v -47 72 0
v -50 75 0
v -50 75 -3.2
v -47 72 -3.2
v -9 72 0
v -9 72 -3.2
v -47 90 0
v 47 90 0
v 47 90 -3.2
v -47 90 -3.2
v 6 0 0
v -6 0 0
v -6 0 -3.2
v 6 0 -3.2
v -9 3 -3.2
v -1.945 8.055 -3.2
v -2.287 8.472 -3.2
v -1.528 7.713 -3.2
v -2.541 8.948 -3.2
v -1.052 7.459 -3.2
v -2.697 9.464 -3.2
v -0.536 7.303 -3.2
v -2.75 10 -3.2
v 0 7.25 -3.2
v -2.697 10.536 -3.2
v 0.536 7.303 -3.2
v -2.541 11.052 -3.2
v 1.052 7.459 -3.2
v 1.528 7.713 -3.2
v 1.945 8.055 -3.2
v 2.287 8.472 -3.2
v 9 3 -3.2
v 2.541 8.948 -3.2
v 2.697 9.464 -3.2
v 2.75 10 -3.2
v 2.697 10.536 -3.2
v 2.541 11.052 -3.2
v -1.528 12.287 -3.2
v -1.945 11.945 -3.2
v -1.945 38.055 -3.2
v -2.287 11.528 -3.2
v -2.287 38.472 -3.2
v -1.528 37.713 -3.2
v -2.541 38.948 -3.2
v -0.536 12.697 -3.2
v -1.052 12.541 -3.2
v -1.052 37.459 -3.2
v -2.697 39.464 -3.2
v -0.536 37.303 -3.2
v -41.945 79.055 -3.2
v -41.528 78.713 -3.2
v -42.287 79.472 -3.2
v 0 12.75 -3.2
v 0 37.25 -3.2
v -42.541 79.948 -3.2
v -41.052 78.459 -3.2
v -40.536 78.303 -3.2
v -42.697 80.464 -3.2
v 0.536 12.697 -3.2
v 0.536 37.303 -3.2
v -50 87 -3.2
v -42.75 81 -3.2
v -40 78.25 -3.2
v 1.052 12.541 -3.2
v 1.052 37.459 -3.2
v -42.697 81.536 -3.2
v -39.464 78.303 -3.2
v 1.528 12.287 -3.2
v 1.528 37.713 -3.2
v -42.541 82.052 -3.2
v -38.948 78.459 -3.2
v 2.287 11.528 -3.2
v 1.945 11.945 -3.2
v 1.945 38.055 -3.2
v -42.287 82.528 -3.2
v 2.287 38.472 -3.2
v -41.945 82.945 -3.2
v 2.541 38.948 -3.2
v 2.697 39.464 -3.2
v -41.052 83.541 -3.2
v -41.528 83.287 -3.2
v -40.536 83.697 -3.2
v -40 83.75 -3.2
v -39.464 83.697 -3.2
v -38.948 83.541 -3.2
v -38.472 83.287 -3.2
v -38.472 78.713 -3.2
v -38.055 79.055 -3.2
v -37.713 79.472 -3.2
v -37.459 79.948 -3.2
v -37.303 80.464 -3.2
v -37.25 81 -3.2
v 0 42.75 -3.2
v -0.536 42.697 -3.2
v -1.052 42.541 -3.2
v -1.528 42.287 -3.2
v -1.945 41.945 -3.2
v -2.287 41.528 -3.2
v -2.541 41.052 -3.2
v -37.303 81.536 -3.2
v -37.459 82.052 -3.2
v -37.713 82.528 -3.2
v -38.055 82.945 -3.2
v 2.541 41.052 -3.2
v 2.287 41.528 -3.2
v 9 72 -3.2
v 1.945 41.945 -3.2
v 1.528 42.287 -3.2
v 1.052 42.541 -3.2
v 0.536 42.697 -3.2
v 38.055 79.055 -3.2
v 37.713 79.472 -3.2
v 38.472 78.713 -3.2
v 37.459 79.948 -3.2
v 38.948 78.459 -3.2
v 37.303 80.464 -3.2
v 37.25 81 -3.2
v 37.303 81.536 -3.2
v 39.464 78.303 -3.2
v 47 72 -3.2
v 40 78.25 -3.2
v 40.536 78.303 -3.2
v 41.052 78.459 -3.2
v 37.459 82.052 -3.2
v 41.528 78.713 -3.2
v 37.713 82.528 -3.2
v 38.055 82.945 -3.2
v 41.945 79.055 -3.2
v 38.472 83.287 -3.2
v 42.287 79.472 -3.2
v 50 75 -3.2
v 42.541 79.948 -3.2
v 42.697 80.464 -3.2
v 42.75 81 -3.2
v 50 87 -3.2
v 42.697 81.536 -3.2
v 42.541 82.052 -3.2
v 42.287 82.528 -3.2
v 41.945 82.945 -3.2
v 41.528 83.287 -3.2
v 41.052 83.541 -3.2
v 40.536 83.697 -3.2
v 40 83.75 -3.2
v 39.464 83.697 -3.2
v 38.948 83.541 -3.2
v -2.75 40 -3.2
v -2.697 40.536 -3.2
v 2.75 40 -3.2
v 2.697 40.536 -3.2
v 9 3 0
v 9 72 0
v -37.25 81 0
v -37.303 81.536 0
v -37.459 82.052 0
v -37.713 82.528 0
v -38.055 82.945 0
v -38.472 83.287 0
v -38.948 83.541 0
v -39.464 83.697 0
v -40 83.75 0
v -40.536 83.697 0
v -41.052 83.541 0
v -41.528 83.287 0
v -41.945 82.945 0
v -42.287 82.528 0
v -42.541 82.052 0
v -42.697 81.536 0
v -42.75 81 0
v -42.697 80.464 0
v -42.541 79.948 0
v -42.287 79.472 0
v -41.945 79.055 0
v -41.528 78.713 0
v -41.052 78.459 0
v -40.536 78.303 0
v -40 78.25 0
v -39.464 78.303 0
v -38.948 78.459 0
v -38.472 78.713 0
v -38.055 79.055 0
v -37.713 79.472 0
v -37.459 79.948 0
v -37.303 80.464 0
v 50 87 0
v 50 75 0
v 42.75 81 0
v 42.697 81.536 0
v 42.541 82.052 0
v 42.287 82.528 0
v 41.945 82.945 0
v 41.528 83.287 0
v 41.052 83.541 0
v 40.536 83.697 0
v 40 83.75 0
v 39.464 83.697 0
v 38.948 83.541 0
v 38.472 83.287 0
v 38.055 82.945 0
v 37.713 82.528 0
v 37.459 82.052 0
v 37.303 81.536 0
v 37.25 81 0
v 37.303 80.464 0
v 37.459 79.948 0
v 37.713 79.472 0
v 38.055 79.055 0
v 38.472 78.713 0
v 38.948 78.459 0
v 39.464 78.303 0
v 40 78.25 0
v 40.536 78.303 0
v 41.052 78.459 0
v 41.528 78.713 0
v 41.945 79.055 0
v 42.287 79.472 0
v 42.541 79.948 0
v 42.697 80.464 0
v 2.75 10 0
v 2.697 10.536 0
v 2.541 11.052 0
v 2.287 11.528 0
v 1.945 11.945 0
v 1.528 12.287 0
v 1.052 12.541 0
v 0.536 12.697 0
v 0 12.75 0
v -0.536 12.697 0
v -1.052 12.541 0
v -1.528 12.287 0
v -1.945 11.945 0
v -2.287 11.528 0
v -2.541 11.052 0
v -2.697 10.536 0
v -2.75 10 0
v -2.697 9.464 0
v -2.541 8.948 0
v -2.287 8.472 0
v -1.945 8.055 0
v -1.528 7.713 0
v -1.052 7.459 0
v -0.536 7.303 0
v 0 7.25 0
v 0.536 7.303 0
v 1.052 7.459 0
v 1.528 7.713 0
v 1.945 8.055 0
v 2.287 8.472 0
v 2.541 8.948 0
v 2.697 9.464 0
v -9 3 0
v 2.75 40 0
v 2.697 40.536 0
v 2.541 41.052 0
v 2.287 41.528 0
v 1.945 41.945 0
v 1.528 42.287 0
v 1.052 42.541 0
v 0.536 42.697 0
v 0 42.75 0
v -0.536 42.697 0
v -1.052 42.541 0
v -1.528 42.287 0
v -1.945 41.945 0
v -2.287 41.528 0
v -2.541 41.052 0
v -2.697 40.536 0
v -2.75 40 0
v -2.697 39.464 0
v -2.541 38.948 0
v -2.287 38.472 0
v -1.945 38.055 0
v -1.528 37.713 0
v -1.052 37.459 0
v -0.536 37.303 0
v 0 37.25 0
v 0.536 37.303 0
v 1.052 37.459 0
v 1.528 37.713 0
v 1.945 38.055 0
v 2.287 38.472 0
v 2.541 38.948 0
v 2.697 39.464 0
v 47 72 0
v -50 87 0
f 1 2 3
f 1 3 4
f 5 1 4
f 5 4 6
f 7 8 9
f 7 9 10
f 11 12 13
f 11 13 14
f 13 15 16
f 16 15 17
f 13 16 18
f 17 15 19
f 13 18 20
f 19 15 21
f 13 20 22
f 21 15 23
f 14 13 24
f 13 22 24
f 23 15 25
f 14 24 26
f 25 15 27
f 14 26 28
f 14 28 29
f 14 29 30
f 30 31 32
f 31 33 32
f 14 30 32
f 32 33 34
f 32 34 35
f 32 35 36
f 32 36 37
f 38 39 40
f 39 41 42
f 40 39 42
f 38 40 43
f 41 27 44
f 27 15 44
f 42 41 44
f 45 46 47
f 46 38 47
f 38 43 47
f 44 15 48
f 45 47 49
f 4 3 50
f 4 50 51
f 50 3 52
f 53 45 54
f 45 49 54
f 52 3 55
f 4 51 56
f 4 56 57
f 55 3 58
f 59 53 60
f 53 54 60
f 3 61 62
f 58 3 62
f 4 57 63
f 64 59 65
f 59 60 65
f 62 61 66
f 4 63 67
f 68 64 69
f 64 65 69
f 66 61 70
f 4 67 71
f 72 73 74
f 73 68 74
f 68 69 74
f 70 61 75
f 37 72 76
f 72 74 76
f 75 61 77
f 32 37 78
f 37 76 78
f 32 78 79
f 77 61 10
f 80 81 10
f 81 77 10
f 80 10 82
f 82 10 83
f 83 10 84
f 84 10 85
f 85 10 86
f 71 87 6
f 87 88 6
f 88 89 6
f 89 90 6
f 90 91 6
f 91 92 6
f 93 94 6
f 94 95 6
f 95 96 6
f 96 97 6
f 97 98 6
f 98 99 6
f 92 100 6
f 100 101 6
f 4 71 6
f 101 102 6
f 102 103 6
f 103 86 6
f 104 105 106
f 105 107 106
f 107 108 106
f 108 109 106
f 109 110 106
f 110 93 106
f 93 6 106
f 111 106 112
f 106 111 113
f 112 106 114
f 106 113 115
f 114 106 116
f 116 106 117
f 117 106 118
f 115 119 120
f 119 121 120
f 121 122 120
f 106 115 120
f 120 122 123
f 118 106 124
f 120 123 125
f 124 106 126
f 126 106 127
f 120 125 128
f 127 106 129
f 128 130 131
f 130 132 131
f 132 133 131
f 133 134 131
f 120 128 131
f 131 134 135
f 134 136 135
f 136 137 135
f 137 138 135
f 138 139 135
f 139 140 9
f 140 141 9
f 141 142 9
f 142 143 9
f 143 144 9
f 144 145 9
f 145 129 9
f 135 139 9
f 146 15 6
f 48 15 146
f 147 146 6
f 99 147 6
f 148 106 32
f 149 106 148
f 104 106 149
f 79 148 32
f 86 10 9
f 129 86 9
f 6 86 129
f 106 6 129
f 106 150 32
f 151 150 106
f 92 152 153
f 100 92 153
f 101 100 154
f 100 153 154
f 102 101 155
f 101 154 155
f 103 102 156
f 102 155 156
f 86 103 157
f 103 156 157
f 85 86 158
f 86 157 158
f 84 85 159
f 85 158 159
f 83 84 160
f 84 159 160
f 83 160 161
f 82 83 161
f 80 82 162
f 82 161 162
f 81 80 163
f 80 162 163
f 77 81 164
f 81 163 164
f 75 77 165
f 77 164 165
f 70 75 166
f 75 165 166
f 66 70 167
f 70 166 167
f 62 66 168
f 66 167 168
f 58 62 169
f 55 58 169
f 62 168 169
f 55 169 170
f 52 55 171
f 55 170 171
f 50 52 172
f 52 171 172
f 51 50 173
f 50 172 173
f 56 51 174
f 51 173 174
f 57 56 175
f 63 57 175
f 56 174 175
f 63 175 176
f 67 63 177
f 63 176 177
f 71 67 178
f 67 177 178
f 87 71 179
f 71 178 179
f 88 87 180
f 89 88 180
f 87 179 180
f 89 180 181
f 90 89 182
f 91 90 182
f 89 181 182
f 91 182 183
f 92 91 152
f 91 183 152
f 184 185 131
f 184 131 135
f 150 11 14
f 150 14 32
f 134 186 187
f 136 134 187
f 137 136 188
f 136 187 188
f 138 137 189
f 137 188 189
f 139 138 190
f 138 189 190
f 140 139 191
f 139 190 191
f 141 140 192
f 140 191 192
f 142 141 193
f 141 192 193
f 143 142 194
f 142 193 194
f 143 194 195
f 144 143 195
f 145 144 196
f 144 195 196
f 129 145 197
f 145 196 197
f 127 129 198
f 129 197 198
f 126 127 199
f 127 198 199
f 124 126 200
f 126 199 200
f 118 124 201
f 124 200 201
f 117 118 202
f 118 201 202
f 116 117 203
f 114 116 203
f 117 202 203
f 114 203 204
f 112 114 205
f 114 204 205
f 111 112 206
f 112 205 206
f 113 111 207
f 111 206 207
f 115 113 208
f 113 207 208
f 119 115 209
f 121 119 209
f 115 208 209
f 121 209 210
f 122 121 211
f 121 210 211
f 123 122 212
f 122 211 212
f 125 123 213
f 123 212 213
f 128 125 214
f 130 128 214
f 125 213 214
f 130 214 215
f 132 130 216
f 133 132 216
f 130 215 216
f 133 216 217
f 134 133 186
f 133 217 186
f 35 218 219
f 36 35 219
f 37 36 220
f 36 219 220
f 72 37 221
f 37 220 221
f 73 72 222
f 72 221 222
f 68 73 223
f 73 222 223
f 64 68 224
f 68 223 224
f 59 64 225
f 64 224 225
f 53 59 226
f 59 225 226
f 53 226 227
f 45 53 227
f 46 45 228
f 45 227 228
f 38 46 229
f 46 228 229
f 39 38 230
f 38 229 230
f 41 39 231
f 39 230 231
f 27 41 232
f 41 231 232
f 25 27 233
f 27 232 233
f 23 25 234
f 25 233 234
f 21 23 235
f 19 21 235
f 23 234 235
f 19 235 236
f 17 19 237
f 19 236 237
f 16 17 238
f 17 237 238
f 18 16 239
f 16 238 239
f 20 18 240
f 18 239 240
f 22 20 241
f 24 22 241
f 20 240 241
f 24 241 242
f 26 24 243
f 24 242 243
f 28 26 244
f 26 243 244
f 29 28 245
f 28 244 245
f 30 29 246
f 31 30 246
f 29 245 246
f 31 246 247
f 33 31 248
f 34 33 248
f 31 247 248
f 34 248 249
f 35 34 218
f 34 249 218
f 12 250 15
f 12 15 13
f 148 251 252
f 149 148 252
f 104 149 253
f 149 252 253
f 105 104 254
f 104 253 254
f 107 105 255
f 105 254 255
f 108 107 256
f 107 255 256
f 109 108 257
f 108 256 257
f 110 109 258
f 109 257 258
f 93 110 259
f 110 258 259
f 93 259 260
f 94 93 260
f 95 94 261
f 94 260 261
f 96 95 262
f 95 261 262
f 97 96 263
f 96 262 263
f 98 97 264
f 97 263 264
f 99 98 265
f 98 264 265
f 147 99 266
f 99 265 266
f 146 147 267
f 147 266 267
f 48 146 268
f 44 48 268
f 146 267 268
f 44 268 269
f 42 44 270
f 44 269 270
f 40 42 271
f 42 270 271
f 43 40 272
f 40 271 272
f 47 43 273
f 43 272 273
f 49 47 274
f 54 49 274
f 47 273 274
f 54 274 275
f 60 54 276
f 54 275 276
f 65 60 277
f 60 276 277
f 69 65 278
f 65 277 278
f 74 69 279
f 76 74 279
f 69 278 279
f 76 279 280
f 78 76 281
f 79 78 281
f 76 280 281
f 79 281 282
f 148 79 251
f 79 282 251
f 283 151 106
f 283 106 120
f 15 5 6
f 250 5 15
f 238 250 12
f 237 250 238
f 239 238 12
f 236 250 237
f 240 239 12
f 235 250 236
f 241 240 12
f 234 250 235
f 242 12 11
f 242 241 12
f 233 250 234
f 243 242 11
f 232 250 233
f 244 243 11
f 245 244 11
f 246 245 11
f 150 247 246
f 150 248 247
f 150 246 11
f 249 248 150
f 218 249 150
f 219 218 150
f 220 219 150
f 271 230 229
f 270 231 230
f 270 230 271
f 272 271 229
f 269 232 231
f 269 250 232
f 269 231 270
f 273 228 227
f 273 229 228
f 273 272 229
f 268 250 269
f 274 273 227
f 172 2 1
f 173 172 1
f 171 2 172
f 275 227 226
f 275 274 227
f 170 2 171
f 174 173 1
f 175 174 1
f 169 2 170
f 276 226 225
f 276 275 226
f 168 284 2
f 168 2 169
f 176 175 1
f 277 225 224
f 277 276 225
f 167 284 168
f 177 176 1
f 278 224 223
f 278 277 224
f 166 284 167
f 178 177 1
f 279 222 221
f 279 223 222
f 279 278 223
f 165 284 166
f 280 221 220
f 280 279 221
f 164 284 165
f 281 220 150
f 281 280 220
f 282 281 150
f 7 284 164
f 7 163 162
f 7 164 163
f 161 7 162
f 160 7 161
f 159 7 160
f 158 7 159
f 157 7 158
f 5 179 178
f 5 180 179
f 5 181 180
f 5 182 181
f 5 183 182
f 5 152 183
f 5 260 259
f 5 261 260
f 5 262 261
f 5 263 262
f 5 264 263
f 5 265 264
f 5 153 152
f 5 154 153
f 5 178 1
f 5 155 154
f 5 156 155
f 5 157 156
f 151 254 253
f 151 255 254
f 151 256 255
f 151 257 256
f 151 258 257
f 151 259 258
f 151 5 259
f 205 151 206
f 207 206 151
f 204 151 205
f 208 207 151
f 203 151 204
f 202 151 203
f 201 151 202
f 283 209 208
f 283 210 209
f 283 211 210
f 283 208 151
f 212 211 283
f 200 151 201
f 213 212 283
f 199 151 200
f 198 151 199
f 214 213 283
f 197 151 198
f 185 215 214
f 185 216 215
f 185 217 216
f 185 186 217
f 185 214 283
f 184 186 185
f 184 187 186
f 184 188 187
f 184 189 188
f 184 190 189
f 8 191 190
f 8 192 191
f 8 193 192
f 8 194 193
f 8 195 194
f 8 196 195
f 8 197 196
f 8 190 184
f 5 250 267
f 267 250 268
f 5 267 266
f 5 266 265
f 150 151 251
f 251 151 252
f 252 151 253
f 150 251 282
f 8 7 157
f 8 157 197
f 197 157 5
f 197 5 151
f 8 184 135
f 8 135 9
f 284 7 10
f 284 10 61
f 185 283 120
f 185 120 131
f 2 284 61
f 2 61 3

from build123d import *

# Parameters (mm, degrees)
SKETCH1_R           = 2.75
BOSS_EXTRUDE1_DEPTH = 3.2


with BuildPart() as part:
    # Sketch1 → Boss-Extrude1 (new body)
    with BuildSketch(Plane.XY):
        Polygon((-50, 75), (-47, 72), (-9, 72), (-9, 3), (-6, 0), (6, 0), (9, 3), (9, 72), (47, 72), (50, 75), (50, 87), (47, 90), (-47, 90), (-50, 87), align=None)
        with Locations((40, 81)):
            Circle(SKETCH1_R, mode=Mode.SUBTRACT)
        with Locations((0, 40)):
            Circle(SKETCH1_R, mode=Mode.SUBTRACT)
        with Locations((0, 10)):
            Circle(SKETCH1_R, mode=Mode.SUBTRACT)
        with Locations((-40, 81)):
            Circle(SKETCH1_R, mode=Mode.SUBTRACT)
    extrude(amount=-BOSS_EXTRUDE1_DEPTH)


solid = part.part
